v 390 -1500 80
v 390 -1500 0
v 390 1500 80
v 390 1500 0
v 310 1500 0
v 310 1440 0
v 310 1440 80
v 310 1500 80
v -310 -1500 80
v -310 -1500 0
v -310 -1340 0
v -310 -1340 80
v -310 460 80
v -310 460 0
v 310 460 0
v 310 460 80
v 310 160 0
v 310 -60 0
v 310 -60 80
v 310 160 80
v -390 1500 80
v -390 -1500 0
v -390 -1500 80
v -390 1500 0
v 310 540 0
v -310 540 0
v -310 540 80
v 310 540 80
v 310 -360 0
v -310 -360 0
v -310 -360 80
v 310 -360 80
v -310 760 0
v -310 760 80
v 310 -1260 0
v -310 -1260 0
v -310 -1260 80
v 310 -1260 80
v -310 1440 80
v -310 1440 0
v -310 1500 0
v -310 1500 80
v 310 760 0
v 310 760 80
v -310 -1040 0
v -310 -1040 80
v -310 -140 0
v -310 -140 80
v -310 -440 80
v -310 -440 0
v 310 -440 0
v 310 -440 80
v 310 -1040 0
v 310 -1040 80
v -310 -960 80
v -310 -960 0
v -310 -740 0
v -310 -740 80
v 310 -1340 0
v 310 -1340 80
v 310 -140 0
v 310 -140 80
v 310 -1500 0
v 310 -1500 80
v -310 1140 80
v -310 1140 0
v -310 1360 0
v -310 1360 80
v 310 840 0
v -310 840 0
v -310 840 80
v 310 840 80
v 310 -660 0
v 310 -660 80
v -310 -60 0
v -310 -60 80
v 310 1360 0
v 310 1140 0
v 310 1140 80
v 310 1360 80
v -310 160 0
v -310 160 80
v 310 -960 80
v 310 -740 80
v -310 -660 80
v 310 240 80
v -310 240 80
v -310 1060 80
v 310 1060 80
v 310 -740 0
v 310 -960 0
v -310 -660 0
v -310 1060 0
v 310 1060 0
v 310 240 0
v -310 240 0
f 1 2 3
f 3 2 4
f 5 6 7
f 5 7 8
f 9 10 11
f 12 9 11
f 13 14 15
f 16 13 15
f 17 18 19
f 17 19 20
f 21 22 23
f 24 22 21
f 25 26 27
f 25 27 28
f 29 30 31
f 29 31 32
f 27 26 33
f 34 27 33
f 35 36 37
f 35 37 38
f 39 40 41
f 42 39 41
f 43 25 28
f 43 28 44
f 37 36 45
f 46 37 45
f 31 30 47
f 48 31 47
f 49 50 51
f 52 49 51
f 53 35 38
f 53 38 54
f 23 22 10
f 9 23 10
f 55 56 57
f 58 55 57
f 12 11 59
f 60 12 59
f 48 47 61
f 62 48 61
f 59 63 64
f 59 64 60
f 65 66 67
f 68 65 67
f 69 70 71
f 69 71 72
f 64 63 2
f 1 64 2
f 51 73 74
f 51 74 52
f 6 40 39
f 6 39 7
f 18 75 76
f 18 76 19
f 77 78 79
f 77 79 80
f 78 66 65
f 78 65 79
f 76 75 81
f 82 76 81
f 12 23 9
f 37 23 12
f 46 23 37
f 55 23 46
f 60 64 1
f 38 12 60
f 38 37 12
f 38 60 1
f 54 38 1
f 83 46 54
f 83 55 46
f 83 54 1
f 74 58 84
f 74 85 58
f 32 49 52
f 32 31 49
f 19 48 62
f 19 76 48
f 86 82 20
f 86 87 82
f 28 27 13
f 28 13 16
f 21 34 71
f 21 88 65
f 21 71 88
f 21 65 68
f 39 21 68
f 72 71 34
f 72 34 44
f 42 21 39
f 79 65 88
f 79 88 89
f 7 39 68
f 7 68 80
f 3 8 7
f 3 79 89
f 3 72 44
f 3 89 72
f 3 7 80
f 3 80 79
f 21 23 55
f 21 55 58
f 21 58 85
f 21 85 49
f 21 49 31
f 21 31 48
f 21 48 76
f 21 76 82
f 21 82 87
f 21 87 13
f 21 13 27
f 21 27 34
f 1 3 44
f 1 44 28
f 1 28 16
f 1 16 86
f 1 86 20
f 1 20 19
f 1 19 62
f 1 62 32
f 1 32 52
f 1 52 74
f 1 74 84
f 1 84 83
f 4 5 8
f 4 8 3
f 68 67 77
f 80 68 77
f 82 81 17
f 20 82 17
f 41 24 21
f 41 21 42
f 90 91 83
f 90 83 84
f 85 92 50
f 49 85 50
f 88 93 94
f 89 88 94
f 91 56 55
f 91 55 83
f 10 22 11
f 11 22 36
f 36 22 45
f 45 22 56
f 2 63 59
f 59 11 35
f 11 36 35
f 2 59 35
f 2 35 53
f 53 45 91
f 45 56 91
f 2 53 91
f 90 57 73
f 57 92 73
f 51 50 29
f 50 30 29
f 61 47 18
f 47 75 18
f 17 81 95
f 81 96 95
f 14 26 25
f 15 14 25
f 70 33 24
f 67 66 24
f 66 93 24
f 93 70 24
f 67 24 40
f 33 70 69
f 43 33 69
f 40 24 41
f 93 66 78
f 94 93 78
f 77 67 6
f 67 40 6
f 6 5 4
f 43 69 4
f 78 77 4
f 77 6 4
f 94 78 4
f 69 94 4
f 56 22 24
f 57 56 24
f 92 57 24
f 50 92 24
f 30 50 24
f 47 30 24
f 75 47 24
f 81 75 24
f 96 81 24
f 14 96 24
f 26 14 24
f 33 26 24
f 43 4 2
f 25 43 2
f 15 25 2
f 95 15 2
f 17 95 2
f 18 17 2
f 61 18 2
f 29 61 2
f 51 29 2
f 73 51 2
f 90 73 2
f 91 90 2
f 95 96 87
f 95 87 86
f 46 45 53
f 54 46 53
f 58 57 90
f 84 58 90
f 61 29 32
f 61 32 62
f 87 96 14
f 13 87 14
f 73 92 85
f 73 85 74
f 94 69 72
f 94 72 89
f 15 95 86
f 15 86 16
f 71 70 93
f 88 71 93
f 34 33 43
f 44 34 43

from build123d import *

# Parameters (mm, degrees)
SKETCH_1_W       = 80
SKETCH_1_H       = 3000
EXTRUDE_1_DEPTH  = 80
SKETCH_2_W       = 80
SKETCH_2_H       = 3000
EXTRUDE_2_DEPTH  = 80
SKETCH_3_W       = 720
SKETCH_3_H       = 80
EXTRUDE_3_DEPTH  = 80
SKETCH_4_W       = 720
SKETCH_4_H       = 80
EXTRUDE_4_DEPTH  = 80
SKETCH_5_W       = 720
SKETCH_5_H       = 80
EXTRUDE_5_DEPTH  = 80
SKETCH_6_W       = 720
SKETCH_6_H       = 80
EXTRUDE_6_DEPTH  = 80
SKETCH_7_W       = 720
SKETCH_7_H       = 80
EXTRUDE_7_DEPTH  = 80
SKETCH_8_W       = 720
SKETCH_8_H       = 80
EXTRUDE_8_DEPTH  = 80
SKETCH_9_W       = 720
SKETCH_9_H       = 80
EXTRUDE_9_DEPTH  = 80
SKETCH_10_W      = 720
SKETCH_10_H      = 80
EXTRUDE_10_DEPTH = 80
SKETCH_11_W      = 720
SKETCH_11_H      = 80
EXTRUDE_11_DEPTH = 80
SKETCH_12_W      = 720
SKETCH_12_H      = 80
EXTRUDE_12_DEPTH = 80


with BuildPart() as part:
    # 草图1 → 凸台-拉伸1 (new body)
    with BuildSketch(Plane.XY):
        with Locations((-350, 0)):
            Rectangle(SKETCH_1_W, SKETCH_1_H)
    extrude(amount=EXTRUDE_1_DEPTH)



with BuildPart() as body_2:
    # 草图2 → 凸台-拉伸2 (new body)
    with BuildSketch(Plane.XY):
        with Locations((350, 0)):
            Rectangle(SKETCH_2_W, SKETCH_2_H)
    extrude(amount=EXTRUDE_2_DEPTH)


with BuildPart() as part_1:
    add(part.part)

    add(body_2.part)  # 凸台-拉伸3 merges body 2
    # 草图3 → 凸台-拉伸3 (add)
    with BuildSketch(Plane.XY):
        with Locations((0, 1400)):
            Rectangle(SKETCH_3_W, SKETCH_3_H)
    extrude(amount=EXTRUDE_3_DEPTH)

    # 草图4 → 凸台-拉伸4 (add)
    with BuildSketch(Plane.XY):
        with Locations((0, 1100)):
            Rectangle(SKETCH_4_W, SKETCH_4_H)
    extrude(amount=EXTRUDE_4_DEPTH)

    # 草图5 → 凸台-拉伸5 (add)
    with BuildSketch(Plane.XY):
        with Locations((0, 800)):
            Rectangle(SKETCH_5_W, SKETCH_5_H)
    extrude(amount=EXTRUDE_5_DEPTH)

    # 草图6 → 凸台-拉伸6 (add)
    with BuildSketch(Plane.XY):
        with Locations((0, 500)):
            Rectangle(SKETCH_6_W, SKETCH_6_H)
    extrude(amount=EXTRUDE_6_DEPTH)

    # 草图7 → 凸台-拉伸7 (add)
    with BuildSketch(Plane.XY):
        with Locations((0, 200)):
            Rectangle(SKETCH_7_W, SKETCH_7_H)
    extrude(amount=EXTRUDE_7_DEPTH)

    # 草图8 → 凸台-拉伸8 (add)
    with BuildSketch(Plane.XY):
        with Locations((0, -100)):
            Rectangle(SKETCH_8_W, SKETCH_8_H)
    extrude(amount=EXTRUDE_8_DEPTH)

    # 草图9 → 凸台-拉伸9 (add)
    with BuildSketch(Plane.XY):
        with Locations((0, -400)):
            Rectangle(SKETCH_9_W, SKETCH_9_H)
    extrude(amount=EXTRUDE_9_DEPTH)

    # 草图10 → 凸台-拉伸10 (add)
    with BuildSketch(Plane.XY):
        with Locations((0, -700)):
            Rectangle(SKETCH_10_W, SKETCH_10_H)
    extrude(amount=EXTRUDE_10_DEPTH)

    # 草图11 → 凸台-拉伸11 (add)
    with BuildSketch(Plane.XY):
        with Locations((0, -1000)):
            Rectangle(SKETCH_11_W, SKETCH_11_H)
    extrude(amount=EXTRUDE_11_DEPTH)

    # 草图12 → 凸台-拉伸12 (add)
    with BuildSketch(Plane.XY):
        with Locations((0, -1300)):
            Rectangle(SKETCH_12_W, SKETCH_12_H)
    extrude(amount=EXTRUDE_12_DEPTH)


solid = part_1.part
